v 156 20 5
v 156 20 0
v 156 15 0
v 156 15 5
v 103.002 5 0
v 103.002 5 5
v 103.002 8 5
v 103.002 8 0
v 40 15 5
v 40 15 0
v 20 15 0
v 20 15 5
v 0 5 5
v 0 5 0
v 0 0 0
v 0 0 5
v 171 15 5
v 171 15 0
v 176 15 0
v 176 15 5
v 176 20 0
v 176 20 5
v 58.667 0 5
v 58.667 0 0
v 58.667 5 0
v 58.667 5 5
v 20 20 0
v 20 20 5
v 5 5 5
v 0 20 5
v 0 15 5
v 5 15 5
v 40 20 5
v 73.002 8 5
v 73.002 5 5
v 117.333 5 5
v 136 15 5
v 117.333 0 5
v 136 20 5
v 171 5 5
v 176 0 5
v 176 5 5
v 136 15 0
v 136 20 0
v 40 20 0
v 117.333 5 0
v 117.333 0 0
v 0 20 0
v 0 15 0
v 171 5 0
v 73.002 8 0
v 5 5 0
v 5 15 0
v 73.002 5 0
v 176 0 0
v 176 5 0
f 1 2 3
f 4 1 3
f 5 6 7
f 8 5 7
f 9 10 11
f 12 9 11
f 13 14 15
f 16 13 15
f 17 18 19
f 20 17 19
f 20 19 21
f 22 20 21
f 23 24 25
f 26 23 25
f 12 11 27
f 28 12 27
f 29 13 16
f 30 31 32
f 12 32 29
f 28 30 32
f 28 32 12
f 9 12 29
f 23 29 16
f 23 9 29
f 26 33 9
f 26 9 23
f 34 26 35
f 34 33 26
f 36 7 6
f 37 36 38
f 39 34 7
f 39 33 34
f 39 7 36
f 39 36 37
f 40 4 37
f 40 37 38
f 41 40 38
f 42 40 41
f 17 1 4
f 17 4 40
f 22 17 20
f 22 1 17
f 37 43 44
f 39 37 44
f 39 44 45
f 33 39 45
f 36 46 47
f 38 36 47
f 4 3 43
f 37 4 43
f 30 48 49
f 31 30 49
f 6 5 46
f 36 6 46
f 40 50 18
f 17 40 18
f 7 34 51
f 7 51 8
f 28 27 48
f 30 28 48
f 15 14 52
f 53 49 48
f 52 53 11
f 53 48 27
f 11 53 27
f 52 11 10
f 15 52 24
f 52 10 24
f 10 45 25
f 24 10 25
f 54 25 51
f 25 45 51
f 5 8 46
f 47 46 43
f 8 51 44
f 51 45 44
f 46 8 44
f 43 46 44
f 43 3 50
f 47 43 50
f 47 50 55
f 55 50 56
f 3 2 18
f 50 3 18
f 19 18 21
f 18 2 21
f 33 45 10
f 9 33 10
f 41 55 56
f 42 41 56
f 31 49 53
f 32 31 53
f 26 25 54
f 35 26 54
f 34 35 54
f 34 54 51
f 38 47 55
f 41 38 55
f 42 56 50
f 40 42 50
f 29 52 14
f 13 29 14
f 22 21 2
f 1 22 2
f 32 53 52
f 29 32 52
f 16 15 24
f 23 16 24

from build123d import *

# Parameters (mm, degrees)
SALIENTE_EXTRUIR1_DEPTH = 5
CROQUIS2_W              = 30
CROQUIS2_H              = 3
CORTAR_EXTRUIR1_DEPTH   = 10


with BuildPart() as part:
    # Croquis1 → Saliente-Extruir1 (new body)
    with BuildSketch(Plane.XY):
        Polygon((117.333333333, 0), (176, 0), (176, 5), (171, 5), (171, 15), (176, 15), (176, 20), (156, 20), (156, 15), (136, 15), (136, 20), (40, 20), (40, 15), (20, 15), (20, 20), (0, 20), (0, 15), (5, 15), (5, 5), (0, 5), (0, 0), (58.666666667, 0), (58.666666667, 5), (117.333333333, 5), align=None)
    extrude(amount=SALIENTE_EXTRUIR1_DEPTH)

    # Croquis2 → Cortar-Extruir1 (cut)
    with BuildSketch(Plane.XY.offset(5)):
        with Locations((88.001666667, 6.5)):
            Rectangle(CROQUIS2_W, CROQUIS2_H)
    extrude(amount=-CORTAR_EXTRUIR1_DEPTH, mode=Mode.SUBTRACT)


solid = part.part
